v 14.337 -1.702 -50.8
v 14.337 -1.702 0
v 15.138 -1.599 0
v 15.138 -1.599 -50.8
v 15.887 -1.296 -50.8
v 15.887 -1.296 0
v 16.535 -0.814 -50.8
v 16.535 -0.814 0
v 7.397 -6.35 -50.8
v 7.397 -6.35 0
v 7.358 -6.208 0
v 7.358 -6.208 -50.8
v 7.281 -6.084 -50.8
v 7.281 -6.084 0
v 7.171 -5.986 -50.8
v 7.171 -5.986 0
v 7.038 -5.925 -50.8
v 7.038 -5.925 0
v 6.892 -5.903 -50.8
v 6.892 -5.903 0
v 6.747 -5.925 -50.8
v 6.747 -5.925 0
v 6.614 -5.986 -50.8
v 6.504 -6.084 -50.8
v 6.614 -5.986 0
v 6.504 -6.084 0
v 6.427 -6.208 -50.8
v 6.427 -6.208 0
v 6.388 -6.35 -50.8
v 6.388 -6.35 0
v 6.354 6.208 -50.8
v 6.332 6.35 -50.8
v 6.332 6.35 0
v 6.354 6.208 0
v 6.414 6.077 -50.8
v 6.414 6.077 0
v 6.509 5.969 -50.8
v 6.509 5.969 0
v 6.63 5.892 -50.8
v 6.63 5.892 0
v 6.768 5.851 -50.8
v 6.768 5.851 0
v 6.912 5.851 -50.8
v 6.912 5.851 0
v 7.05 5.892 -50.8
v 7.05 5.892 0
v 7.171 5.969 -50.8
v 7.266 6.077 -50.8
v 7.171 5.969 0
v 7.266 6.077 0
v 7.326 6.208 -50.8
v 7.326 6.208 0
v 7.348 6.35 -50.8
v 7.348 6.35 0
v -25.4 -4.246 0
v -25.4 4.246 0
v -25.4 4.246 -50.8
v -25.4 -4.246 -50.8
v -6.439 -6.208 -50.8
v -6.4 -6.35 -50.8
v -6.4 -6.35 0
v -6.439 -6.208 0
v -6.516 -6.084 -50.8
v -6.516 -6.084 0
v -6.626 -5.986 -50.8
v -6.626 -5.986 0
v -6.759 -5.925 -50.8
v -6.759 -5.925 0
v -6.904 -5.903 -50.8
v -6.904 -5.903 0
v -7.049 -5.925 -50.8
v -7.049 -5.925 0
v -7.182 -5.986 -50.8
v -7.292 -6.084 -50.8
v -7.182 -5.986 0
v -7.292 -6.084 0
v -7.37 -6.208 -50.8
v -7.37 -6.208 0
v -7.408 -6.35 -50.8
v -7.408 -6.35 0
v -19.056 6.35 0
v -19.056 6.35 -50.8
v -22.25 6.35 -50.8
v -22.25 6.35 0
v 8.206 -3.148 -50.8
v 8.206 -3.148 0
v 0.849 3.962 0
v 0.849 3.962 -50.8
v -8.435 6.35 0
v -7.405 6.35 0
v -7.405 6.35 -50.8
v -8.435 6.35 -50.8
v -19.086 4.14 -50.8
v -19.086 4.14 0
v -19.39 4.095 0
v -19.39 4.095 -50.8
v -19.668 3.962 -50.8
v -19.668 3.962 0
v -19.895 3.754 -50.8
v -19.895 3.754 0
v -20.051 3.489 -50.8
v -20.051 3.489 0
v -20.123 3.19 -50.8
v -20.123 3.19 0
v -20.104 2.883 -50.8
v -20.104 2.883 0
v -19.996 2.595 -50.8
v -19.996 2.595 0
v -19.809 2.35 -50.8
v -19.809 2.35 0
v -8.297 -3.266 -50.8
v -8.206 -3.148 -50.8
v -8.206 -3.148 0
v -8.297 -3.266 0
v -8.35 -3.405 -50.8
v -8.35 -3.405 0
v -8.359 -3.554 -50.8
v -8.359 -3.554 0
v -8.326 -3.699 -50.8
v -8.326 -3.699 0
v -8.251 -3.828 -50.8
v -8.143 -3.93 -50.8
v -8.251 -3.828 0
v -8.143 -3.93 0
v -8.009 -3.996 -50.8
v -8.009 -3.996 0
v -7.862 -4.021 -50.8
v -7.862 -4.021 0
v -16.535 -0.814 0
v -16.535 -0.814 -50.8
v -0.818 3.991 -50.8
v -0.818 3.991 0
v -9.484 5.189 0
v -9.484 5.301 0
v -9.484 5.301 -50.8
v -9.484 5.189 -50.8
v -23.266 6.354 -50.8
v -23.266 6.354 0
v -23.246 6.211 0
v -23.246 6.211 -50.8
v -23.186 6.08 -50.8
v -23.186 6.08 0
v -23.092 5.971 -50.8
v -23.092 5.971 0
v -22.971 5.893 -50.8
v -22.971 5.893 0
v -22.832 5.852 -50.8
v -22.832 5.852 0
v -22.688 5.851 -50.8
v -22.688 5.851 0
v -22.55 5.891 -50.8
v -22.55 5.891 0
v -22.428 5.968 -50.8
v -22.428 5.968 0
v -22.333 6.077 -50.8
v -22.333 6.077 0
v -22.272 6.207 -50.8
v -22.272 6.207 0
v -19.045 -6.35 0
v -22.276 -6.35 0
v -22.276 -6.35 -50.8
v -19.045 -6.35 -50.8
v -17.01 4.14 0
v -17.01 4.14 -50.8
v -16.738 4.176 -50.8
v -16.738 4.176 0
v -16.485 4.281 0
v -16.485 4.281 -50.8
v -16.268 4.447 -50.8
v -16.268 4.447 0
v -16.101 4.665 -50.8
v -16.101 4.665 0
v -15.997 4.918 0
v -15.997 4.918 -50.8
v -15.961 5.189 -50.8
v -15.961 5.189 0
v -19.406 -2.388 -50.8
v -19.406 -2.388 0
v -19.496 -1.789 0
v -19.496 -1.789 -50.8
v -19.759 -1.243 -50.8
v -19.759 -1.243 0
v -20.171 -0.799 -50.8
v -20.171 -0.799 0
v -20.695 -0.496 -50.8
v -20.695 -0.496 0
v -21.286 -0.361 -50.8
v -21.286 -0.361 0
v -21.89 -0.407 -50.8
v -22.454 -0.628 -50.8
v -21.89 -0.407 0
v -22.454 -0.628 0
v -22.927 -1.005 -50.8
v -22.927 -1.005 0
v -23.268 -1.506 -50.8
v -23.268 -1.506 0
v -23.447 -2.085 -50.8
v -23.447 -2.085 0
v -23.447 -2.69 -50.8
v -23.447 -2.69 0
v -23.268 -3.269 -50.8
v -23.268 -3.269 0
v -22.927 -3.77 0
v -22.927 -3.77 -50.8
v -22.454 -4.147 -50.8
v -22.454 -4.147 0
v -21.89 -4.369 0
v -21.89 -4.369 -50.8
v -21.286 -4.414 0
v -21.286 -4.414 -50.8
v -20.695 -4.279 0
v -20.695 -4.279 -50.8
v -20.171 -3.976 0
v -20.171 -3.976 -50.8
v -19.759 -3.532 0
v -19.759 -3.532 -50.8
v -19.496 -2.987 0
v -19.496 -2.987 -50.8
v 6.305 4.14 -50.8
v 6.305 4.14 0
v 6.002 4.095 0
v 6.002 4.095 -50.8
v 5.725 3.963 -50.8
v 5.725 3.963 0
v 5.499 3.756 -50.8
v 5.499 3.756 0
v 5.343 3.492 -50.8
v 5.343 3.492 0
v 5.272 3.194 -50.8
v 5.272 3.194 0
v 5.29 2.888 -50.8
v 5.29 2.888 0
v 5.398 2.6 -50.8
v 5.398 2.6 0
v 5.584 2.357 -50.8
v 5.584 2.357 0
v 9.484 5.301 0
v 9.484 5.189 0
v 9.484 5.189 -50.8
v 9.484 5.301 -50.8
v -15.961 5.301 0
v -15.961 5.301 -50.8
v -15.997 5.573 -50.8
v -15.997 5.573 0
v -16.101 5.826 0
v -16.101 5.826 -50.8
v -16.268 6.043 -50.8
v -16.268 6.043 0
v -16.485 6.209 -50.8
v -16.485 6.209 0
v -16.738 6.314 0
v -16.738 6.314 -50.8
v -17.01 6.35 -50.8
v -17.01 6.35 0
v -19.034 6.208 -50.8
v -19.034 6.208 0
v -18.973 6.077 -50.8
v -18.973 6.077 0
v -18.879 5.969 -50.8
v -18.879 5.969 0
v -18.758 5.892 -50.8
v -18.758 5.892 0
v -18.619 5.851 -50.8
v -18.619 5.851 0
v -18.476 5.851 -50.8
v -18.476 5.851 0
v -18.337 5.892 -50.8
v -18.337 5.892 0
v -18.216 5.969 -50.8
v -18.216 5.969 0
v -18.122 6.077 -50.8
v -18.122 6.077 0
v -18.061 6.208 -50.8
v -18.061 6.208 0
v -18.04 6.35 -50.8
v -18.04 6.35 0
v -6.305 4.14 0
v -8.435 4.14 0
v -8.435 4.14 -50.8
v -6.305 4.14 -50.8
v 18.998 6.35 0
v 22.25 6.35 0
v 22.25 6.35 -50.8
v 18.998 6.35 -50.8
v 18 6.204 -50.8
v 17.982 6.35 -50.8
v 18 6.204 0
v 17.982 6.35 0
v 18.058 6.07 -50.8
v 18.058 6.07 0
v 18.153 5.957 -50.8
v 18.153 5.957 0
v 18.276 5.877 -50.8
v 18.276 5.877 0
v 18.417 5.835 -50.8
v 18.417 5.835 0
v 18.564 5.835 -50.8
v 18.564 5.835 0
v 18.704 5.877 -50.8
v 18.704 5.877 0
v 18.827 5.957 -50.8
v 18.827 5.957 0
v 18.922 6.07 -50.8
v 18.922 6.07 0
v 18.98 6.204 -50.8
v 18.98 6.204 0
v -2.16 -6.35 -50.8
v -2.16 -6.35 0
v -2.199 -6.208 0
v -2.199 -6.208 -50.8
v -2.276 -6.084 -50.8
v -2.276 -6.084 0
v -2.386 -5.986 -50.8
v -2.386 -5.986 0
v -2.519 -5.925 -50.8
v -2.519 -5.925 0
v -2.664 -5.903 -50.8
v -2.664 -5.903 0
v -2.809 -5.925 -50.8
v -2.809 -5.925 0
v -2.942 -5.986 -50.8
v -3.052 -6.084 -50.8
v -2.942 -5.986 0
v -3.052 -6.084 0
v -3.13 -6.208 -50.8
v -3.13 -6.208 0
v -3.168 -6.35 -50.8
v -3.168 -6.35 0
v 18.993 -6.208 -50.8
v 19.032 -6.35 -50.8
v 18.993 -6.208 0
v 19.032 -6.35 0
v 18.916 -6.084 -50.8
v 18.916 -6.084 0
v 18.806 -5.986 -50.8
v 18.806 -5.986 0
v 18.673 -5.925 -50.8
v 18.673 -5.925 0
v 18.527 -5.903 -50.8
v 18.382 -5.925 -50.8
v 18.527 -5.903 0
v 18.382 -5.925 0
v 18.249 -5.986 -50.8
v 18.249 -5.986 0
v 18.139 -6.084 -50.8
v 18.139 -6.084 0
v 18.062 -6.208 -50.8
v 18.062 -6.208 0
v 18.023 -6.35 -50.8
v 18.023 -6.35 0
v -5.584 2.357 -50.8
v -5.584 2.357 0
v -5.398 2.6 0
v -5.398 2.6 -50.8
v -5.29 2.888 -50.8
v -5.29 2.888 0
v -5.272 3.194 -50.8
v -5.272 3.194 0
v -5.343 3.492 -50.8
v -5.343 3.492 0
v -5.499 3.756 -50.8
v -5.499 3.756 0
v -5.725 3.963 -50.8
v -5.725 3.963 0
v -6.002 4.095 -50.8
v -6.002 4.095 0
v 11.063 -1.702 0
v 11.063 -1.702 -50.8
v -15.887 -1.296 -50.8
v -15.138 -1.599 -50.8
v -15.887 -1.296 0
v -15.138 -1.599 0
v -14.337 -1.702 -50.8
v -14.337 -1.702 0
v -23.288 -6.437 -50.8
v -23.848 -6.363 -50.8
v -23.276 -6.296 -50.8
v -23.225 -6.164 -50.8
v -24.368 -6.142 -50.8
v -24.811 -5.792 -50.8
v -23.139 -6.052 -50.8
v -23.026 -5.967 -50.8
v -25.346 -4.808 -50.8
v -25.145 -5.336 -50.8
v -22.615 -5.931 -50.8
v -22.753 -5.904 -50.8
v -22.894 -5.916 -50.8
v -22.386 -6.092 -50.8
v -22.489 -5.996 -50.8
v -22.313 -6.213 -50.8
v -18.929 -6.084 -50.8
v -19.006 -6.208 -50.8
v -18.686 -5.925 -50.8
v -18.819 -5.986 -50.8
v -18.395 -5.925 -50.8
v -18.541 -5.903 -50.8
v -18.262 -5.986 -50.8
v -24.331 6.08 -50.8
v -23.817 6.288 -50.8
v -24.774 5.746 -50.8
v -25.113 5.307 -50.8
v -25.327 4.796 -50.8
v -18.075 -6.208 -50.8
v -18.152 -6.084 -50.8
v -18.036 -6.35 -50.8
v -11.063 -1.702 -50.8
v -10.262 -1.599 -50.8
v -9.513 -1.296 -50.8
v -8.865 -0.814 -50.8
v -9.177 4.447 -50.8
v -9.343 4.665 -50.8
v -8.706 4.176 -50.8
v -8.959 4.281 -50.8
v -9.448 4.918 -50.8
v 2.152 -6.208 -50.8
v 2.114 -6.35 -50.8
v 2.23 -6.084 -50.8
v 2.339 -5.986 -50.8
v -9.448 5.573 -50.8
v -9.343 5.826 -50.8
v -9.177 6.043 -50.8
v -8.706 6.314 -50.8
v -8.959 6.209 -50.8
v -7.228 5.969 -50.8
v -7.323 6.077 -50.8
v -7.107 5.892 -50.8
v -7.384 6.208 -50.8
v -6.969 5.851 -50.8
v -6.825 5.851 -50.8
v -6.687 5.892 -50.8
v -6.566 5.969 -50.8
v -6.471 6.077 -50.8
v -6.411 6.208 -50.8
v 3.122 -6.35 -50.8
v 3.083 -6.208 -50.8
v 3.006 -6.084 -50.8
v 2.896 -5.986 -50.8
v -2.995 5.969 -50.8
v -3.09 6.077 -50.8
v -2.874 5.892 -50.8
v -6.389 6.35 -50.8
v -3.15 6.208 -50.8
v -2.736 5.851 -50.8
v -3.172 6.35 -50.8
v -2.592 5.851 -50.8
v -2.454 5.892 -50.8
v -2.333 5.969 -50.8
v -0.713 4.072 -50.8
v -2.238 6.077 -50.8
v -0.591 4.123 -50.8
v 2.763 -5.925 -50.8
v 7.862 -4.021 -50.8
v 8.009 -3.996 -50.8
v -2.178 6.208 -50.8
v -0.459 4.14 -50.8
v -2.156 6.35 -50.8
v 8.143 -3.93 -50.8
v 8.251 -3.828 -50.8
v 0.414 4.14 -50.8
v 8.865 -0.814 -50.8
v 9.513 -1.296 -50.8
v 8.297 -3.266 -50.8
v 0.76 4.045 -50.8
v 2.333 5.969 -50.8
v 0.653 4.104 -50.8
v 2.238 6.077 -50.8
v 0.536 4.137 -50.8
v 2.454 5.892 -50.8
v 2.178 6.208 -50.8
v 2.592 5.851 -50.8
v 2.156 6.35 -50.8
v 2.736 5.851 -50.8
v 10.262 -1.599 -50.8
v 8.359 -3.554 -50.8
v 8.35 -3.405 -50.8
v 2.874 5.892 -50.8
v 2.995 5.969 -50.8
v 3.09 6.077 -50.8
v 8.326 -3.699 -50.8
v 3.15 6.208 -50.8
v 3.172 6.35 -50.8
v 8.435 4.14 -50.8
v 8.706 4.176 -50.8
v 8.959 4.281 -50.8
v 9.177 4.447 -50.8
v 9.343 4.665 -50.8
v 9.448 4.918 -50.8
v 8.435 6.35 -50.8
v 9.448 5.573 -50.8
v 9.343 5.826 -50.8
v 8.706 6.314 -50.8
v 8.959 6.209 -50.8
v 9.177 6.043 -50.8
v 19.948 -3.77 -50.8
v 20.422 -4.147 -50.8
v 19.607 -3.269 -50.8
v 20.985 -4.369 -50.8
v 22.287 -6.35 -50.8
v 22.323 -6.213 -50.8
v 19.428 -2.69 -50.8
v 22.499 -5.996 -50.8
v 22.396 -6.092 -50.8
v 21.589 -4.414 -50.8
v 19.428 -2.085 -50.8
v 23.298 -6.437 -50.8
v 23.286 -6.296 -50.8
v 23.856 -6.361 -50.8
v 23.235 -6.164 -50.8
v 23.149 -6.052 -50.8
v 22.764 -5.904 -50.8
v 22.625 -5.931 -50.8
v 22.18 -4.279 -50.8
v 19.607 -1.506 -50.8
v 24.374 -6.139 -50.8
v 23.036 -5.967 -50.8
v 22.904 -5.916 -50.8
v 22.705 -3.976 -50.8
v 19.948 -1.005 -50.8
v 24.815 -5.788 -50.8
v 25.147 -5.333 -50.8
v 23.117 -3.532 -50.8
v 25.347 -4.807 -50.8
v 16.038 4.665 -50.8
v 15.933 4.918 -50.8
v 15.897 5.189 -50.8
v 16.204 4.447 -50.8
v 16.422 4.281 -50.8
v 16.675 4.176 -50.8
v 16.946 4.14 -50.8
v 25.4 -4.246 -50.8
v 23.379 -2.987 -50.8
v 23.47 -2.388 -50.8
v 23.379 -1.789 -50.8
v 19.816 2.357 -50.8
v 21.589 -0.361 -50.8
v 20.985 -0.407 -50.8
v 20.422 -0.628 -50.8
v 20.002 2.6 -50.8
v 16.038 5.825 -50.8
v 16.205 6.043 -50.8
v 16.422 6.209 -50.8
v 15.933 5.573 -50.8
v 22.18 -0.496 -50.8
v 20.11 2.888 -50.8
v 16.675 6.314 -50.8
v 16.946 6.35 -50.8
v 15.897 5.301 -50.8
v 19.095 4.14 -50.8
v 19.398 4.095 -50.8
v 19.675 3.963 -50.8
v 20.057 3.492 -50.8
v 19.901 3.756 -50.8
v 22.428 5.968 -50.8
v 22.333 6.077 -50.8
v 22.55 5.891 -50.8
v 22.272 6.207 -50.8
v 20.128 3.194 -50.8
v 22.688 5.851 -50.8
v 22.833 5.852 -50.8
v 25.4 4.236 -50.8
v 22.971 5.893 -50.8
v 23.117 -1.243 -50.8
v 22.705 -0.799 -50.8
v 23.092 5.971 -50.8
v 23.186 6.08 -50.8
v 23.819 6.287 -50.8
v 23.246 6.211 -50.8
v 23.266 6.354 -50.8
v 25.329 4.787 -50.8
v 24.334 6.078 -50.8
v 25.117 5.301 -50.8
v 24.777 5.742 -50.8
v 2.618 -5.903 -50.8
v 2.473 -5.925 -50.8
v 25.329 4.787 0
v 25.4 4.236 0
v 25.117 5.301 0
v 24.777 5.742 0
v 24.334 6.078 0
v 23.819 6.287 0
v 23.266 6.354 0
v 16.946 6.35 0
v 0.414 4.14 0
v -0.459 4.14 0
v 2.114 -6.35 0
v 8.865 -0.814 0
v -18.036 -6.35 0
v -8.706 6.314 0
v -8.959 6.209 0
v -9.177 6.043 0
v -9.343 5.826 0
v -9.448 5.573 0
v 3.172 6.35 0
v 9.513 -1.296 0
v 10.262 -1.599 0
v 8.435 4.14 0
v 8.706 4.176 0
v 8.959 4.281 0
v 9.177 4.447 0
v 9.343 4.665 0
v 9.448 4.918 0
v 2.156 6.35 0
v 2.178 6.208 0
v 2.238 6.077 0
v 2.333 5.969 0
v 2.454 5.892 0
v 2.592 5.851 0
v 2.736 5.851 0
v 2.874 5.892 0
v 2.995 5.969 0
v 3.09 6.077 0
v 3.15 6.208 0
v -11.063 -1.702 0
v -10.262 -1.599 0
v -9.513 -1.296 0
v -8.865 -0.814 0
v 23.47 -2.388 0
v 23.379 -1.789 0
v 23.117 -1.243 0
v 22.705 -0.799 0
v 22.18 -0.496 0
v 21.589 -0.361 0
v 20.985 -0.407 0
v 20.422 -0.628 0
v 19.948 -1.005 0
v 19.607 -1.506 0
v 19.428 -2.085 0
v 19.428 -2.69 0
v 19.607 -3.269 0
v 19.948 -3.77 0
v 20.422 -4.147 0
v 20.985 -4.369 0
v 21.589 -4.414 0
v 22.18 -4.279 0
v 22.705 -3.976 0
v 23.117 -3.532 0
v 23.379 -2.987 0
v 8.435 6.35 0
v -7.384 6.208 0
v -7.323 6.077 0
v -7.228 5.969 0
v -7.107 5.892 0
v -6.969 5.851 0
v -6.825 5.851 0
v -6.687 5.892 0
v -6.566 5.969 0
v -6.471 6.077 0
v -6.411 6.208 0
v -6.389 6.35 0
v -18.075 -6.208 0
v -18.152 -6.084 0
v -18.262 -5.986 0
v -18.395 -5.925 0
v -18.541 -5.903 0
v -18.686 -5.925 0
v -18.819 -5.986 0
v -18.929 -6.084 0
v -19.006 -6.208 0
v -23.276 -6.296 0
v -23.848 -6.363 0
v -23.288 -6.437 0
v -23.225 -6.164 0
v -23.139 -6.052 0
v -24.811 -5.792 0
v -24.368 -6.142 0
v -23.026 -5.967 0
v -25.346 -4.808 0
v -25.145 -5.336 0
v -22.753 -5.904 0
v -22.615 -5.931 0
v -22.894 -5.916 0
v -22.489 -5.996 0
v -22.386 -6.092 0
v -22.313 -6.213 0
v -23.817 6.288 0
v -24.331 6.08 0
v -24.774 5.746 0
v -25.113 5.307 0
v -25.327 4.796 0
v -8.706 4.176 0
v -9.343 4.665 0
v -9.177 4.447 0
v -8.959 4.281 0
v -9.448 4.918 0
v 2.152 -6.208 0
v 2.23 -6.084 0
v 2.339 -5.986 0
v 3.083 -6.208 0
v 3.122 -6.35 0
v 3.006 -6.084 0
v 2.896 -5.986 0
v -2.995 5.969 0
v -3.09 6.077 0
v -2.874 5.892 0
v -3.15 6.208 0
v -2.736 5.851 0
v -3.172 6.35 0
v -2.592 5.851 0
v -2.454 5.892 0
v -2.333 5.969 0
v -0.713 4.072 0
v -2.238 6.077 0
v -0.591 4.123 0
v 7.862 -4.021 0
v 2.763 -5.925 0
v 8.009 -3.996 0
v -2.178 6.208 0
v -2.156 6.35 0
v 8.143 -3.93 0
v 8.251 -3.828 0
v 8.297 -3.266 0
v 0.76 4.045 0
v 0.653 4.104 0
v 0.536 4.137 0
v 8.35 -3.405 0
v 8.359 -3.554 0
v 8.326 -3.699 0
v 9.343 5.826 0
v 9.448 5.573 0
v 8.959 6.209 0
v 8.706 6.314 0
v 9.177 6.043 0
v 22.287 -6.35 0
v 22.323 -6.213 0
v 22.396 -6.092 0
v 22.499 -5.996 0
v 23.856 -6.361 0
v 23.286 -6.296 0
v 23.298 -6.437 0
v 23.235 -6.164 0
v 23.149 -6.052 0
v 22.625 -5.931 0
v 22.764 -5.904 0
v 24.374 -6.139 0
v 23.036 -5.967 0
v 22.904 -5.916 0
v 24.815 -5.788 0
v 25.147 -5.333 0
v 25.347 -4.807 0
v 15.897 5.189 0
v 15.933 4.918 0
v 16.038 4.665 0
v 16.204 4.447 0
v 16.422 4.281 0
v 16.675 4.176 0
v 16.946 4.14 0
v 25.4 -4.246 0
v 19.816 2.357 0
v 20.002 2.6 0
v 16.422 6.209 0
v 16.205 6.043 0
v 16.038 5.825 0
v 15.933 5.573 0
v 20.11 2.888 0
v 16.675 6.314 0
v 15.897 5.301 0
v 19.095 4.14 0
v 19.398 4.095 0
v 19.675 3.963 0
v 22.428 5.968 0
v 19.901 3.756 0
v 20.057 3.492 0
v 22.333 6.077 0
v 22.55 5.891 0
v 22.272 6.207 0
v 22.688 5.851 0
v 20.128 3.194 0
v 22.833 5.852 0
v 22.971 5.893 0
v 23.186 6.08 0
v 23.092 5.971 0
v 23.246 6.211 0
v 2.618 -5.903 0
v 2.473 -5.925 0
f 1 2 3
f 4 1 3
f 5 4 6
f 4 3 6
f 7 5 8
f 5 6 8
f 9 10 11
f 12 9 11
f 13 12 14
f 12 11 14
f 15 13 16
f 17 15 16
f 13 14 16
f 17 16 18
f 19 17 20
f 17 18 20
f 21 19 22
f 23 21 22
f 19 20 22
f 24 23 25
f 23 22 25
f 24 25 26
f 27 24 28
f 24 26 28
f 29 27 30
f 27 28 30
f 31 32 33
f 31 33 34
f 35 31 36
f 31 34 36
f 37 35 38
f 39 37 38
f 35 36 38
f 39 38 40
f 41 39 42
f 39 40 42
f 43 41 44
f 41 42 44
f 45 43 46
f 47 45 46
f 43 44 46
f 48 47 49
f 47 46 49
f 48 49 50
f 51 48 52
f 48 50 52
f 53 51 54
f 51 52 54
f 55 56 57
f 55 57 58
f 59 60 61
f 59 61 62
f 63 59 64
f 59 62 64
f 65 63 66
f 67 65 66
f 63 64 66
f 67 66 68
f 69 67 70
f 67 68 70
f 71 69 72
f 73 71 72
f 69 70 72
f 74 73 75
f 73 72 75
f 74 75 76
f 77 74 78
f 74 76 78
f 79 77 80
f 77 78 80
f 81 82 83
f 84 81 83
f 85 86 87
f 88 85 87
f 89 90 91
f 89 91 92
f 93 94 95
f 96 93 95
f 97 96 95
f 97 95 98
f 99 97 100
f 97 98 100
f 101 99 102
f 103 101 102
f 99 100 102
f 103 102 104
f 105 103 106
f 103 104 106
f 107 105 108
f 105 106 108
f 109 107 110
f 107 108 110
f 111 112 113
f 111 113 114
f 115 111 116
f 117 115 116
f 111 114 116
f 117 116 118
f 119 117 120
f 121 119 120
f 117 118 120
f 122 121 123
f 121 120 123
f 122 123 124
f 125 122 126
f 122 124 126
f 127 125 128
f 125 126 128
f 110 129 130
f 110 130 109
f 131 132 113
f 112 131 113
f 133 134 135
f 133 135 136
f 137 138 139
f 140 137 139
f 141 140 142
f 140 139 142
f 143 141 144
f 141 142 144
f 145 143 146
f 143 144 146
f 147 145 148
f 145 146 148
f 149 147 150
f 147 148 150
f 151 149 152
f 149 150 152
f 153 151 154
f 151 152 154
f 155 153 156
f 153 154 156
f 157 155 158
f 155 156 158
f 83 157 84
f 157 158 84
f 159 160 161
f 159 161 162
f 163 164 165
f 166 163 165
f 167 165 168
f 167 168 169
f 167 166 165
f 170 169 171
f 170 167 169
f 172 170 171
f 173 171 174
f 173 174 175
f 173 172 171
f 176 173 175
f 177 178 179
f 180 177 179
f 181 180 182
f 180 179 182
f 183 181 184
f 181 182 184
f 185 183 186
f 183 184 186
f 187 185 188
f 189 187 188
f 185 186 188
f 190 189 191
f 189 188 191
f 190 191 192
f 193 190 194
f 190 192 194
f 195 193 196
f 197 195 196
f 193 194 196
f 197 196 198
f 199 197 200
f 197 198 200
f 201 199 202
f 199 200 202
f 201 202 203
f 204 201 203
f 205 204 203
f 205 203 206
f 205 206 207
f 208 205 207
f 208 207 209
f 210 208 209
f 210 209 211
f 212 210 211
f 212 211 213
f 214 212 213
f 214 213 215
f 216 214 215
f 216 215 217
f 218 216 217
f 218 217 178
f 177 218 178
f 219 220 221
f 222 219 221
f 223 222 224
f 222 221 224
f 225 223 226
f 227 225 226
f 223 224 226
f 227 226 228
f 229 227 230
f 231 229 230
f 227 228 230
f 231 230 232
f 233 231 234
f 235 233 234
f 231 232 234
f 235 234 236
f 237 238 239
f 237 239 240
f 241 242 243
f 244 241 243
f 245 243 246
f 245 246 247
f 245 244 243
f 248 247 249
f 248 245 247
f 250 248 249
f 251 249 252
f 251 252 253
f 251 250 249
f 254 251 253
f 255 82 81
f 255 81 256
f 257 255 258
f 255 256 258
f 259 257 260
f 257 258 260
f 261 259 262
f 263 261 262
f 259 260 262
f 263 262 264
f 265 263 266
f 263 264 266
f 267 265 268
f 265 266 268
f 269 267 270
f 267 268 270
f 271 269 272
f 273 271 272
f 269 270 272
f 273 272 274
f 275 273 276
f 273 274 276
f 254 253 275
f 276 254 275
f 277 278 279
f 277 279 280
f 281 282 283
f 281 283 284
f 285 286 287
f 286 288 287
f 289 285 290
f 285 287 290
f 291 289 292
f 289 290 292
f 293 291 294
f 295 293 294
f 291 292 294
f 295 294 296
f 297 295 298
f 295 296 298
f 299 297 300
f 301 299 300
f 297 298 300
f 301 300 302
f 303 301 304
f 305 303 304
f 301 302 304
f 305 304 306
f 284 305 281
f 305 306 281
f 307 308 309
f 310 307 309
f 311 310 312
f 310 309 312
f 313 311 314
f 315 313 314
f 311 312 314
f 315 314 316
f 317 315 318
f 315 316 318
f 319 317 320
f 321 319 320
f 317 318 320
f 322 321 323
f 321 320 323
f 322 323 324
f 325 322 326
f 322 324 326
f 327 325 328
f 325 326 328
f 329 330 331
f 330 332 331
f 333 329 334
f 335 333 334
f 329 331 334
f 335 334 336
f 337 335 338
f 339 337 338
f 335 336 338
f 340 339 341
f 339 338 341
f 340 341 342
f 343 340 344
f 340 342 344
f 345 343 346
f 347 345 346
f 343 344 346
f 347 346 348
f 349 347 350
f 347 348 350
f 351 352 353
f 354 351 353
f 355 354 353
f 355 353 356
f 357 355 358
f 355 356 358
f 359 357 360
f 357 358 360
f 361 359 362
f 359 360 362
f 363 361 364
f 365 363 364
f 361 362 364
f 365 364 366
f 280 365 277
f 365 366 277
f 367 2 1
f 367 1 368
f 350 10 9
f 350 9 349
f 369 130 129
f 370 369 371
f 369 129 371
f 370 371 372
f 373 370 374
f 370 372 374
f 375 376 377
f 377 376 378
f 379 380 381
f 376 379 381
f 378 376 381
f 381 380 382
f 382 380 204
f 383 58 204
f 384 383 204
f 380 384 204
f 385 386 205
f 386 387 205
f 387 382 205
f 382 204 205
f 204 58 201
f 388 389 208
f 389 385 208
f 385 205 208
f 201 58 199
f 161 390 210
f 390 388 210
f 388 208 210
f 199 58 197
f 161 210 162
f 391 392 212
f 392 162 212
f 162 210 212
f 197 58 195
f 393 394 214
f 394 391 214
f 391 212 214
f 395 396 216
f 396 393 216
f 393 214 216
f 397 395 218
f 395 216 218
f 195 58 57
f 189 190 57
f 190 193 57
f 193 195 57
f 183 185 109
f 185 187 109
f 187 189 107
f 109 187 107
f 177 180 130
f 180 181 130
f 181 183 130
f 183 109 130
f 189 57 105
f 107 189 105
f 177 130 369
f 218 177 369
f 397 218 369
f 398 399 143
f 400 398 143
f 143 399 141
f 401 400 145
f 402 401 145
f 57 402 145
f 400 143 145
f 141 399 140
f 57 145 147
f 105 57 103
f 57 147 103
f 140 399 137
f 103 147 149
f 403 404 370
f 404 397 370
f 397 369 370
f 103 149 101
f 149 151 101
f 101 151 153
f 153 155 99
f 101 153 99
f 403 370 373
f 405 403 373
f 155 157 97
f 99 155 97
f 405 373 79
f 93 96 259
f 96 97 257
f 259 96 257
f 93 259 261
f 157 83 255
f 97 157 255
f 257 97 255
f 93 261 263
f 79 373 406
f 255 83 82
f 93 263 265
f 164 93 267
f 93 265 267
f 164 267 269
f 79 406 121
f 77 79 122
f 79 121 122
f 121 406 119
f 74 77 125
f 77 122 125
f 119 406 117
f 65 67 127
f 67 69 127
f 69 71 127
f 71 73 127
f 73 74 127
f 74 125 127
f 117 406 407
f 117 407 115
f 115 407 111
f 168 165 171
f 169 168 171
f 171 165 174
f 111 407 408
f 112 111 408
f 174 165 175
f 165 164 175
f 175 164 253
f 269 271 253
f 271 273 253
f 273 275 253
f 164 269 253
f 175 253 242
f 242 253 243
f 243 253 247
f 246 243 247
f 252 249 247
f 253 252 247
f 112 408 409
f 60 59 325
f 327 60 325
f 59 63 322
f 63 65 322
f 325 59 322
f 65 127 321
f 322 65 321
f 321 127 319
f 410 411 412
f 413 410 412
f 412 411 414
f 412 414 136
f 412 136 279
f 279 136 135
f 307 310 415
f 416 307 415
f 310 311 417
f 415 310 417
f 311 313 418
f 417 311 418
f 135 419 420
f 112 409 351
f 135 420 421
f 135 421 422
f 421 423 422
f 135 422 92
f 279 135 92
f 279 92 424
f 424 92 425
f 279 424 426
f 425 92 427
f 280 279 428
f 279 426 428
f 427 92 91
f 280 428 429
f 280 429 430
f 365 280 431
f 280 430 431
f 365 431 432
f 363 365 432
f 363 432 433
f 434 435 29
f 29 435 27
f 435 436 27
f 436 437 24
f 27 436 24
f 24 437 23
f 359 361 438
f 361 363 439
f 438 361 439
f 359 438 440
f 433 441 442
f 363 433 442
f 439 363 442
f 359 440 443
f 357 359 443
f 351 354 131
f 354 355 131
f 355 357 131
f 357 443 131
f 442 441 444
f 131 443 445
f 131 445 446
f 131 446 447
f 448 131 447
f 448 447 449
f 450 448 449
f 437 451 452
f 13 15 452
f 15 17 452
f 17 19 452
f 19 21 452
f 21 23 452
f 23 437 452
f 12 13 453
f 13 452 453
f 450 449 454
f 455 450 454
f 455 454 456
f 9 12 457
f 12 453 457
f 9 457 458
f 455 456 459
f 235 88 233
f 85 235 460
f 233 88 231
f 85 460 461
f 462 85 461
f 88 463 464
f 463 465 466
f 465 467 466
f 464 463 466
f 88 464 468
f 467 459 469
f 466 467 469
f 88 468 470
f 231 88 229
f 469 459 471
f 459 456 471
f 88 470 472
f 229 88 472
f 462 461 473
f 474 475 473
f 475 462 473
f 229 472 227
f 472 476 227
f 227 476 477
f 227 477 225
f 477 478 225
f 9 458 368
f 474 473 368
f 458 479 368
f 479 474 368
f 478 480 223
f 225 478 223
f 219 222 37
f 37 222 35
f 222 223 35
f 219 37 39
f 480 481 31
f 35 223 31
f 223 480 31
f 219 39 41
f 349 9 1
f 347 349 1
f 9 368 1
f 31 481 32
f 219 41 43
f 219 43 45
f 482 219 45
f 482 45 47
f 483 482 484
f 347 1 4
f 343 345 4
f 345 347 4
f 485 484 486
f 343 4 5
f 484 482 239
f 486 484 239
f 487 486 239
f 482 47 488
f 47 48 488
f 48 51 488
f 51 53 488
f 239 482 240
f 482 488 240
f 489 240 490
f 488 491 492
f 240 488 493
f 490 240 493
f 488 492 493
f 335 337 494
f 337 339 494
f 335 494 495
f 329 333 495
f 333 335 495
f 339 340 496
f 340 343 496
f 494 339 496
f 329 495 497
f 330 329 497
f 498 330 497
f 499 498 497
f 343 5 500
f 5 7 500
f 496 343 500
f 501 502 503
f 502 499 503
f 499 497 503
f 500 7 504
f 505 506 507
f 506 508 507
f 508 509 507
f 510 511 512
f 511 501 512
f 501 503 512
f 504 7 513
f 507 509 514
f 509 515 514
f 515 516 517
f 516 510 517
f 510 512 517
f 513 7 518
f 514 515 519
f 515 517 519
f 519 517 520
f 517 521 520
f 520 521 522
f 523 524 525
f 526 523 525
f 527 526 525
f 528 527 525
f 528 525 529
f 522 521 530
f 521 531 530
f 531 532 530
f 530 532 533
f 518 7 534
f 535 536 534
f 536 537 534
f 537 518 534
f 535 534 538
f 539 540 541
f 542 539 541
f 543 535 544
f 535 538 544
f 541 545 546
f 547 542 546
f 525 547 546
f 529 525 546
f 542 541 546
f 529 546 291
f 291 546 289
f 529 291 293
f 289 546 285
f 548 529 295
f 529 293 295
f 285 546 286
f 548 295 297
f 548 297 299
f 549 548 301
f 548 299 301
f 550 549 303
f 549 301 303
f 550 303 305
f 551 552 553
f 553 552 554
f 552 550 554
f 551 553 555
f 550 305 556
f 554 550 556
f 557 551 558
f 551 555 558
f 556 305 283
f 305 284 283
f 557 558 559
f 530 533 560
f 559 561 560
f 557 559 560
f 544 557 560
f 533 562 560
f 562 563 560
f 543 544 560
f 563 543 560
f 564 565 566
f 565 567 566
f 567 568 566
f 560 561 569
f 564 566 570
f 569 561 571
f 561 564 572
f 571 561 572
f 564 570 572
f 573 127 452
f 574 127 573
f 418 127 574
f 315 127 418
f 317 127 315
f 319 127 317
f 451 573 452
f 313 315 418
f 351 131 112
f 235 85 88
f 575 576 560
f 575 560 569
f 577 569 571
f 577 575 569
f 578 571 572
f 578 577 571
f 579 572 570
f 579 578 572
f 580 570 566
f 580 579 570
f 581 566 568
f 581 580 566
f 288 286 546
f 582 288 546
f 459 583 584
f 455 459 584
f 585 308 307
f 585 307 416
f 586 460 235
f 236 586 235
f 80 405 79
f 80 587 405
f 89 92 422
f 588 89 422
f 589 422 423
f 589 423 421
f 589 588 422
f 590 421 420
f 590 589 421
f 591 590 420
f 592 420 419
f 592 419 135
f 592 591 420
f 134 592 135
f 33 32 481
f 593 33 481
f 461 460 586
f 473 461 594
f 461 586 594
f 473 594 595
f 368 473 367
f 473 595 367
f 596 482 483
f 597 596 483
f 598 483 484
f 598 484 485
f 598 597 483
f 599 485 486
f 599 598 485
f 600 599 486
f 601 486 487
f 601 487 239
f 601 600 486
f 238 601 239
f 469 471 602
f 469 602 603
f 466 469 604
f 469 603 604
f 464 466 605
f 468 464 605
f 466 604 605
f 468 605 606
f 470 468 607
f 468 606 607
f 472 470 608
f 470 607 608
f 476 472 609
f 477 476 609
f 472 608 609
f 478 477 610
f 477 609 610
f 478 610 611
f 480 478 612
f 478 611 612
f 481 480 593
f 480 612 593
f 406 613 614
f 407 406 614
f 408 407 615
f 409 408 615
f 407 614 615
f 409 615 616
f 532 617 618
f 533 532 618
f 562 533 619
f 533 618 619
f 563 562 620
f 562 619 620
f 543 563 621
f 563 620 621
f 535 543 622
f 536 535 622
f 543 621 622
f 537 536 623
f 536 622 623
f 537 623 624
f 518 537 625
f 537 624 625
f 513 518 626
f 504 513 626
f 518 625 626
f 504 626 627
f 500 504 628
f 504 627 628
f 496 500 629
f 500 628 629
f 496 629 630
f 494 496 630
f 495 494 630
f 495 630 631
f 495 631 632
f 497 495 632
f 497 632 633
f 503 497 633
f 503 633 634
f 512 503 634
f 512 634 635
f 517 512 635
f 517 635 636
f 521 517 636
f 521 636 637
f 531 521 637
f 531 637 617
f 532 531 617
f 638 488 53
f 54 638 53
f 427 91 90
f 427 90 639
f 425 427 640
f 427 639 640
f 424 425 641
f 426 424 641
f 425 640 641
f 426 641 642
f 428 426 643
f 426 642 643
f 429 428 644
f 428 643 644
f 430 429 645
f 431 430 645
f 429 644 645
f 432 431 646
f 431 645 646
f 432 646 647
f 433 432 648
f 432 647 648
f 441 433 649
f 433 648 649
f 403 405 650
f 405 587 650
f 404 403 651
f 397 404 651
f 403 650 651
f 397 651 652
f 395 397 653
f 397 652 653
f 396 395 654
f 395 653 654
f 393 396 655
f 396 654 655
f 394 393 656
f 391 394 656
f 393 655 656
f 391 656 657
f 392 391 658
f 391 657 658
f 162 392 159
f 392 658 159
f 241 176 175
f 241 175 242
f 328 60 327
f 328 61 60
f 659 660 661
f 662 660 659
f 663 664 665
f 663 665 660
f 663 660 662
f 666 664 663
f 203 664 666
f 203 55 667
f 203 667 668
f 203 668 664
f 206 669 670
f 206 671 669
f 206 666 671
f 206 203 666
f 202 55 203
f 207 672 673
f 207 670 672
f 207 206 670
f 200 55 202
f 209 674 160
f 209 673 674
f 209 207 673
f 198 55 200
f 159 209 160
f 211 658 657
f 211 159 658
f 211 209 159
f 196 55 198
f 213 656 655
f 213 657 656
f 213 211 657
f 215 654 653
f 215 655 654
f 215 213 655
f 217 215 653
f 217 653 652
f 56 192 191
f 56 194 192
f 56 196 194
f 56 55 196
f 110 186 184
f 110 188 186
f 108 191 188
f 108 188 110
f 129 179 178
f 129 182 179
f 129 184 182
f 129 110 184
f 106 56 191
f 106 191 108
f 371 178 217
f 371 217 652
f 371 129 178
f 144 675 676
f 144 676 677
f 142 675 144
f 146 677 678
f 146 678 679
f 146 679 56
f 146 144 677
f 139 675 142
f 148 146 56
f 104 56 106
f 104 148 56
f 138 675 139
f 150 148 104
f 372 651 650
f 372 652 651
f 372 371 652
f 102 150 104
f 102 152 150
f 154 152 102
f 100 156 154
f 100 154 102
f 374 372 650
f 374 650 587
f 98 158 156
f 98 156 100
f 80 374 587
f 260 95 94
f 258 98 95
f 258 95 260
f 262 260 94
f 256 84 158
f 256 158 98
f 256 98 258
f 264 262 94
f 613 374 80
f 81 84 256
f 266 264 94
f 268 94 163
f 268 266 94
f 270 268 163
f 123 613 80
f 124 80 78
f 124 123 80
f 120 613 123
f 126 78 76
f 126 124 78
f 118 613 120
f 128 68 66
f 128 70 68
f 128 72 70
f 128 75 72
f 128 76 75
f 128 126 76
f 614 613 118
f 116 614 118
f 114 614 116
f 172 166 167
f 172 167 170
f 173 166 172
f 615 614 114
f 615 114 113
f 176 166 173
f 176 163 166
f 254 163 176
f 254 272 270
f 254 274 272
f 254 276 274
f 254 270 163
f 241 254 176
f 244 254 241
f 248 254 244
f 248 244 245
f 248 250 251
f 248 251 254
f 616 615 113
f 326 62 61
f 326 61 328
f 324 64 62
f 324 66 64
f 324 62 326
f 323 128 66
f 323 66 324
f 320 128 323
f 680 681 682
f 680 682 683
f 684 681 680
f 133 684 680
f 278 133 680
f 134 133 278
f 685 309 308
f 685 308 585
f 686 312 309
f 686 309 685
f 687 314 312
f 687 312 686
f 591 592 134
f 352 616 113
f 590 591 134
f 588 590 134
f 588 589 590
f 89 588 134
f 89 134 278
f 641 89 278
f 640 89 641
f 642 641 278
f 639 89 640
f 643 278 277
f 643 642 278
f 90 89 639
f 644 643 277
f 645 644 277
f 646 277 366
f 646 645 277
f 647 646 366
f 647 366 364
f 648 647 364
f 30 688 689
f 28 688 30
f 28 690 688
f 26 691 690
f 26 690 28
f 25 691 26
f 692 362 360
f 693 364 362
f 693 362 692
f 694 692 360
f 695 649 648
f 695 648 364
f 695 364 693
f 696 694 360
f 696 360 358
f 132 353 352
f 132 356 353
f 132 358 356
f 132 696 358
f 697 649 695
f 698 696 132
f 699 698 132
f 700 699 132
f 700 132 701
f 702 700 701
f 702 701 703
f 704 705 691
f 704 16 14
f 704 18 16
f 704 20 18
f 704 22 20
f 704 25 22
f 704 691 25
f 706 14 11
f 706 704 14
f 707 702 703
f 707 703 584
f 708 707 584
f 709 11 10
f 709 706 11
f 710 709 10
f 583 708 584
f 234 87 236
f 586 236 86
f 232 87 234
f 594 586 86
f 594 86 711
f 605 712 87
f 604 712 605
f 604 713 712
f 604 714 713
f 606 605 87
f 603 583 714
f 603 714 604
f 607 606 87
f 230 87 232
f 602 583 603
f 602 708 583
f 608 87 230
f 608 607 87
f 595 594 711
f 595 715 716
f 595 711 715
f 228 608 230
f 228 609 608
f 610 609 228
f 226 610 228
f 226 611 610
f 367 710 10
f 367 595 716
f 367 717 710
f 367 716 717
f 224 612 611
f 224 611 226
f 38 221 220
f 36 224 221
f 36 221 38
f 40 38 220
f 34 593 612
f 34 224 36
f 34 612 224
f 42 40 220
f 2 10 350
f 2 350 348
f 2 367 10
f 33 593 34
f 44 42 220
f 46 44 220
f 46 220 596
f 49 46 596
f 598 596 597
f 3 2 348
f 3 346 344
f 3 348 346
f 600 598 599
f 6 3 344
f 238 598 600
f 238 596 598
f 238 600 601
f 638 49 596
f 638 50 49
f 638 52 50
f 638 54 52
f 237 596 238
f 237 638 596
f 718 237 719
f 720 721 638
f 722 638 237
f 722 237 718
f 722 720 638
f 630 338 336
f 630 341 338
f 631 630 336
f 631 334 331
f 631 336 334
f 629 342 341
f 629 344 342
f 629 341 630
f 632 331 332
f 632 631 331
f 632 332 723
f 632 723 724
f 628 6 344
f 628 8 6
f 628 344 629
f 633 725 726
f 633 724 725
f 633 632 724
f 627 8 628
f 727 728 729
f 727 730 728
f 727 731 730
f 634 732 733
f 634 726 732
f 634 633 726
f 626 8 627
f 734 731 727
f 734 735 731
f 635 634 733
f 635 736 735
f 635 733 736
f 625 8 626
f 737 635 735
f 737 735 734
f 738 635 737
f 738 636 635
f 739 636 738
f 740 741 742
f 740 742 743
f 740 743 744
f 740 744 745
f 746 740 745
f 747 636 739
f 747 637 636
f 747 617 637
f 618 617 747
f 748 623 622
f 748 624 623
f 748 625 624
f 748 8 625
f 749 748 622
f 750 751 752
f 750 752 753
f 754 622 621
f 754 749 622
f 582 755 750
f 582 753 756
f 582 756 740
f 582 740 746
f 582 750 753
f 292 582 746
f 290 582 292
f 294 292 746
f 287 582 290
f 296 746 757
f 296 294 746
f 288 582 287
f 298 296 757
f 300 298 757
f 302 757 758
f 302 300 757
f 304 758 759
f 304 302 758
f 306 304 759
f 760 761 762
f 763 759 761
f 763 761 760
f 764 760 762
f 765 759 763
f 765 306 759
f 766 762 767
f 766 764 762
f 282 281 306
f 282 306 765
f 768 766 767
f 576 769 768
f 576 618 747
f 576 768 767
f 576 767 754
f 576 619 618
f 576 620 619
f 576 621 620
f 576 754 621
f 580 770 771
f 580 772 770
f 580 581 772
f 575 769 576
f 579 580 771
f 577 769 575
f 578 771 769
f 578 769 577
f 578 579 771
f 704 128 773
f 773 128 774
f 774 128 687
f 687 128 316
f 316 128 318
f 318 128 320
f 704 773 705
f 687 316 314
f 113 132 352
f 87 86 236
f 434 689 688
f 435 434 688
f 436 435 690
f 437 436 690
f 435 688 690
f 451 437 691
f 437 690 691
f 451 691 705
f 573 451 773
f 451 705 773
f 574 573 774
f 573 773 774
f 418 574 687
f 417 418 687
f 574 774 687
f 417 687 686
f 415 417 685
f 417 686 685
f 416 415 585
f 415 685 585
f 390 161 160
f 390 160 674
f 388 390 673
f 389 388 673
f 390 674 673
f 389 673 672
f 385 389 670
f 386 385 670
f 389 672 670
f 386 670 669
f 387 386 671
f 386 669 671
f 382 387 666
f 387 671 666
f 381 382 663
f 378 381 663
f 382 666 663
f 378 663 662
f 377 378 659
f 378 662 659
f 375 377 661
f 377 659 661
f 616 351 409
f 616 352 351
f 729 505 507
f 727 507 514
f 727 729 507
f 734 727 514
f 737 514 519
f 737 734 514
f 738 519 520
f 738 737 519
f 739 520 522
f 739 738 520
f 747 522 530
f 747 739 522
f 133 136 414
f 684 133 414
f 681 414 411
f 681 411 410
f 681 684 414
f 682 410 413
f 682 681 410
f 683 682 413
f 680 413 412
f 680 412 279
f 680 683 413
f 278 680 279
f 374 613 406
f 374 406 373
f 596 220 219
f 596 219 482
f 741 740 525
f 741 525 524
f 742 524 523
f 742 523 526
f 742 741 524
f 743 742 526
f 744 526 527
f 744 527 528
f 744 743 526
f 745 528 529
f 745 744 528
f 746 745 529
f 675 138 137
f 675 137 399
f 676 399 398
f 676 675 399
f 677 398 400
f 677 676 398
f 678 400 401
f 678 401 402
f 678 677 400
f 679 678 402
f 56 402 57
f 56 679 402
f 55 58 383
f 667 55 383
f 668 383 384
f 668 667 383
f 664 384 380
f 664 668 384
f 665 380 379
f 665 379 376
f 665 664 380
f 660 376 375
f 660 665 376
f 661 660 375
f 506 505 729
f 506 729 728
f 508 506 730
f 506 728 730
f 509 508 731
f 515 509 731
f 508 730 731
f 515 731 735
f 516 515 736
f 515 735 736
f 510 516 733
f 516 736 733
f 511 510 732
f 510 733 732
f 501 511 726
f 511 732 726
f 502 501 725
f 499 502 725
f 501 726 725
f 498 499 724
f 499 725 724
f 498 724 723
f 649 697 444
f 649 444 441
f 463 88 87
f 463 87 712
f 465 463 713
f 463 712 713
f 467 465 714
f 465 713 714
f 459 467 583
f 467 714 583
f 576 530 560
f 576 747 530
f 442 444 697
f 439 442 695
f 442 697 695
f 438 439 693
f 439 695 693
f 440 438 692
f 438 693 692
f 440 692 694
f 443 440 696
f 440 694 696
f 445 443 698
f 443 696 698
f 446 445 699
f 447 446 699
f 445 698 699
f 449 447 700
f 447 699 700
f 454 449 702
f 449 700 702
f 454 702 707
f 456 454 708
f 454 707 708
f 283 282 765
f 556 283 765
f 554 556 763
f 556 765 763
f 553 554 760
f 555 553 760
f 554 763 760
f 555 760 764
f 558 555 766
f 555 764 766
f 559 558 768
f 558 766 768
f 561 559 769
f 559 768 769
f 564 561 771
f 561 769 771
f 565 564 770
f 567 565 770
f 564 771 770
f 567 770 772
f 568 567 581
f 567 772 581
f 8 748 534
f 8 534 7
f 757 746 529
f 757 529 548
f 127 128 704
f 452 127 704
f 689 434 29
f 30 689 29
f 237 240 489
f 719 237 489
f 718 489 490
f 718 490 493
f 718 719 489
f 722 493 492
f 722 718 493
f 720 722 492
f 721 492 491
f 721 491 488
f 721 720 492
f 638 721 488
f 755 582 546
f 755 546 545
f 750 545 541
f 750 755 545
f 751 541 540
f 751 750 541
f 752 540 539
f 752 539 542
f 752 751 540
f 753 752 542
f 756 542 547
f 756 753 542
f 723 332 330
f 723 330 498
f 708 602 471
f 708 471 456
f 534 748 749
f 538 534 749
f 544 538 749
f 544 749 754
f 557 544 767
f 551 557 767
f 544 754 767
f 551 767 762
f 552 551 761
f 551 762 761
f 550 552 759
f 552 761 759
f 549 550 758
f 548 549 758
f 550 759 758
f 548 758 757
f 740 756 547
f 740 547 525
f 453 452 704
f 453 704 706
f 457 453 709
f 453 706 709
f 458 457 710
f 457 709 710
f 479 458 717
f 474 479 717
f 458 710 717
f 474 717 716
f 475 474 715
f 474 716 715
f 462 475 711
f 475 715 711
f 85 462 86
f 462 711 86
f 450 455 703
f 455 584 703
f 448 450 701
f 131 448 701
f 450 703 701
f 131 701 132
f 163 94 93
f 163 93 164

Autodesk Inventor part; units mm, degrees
ref_plane "YZ Plane" through (0, 0, 0) normal (1, 0, 0) x (0, 1, 0)
ref_plane "XZ Plane" through (0, 0, 0) normal (0, 1, 0) x (-1, 0, 0)
ref_plane "XY Plane" through (0, 0, 0) normal (0, 0, 1) x (1, 0, 0)
sketch "Sketch1" plane through (0, 0, 0) normal (0, 0, 1) x (1, 0, 0)
  arc A0 (-8.2061, -3.1475) -> (-7.8618, -4.0207) centre (-7.8531, -3.5128) ccw
  line L0 (-0.8184, 3.9914) -> (-8.2061, -3.1475)
  arc A1 (-0.4592, 4.1402) -> (-0.8184, 3.9914) centre (-0.4592, 3.6322) ccw
  line L1 (0.4145, 4.1402) -> (-0.4592, 4.1402)
  arc A2 (0.8488, 3.962) -> (0.4145, 4.1402) centre (0.4606, 3.6343) ccw
  line L2 (8.2061, -3.1475) -> (0.8488, 3.962)
  arc A3 (7.8618, -4.0207) -> (8.2061, -3.1475) centre (7.8531, -3.5128) ccw
  line L3 (-7.8618, -4.0207) -> (7.8618, -4.0207)
  circle A4 centre (21.4376, -2.3876) radius 2.032
  circle A5 centre (-21.4376, -2.3876) radius 2.032
  arc A6 (16.9463, 6.35) -> (15.8972, 5.301) centre (16.9463, 5.301) ccw
  line L4 (15.8972, 5.301) -> (15.8972, 5.1892)
  arc A7 (15.8972, 5.1892) -> (16.9463, 4.1402) centre (16.9463, 5.1892) ccw
  line L5 (16.9463, 4.1402) -> (19.0952, 4.1402)
  arc A8 (19.8159, 2.3571) -> (19.0952, 4.1402) centre (19.0952, 3.103) ccw
  line L6 (19.8159, 2.3571) -> (16.5346, -0.8136)
  arc A9 (14.3374, -1.7018) -> (16.5346, -0.8136) centre (14.3374, 1.4602) ccw
  line L7 (14.3374, -1.7018) -> (11.0626, -1.7018)
  arc A10 (8.8654, -0.8136) -> (11.0626, -1.7018) centre (11.0626, 1.4602) ccw
  line L8 (8.8654, -0.8136) -> (5.5841, 2.3571)
  arc A11 (6.3048, 4.1402) -> (5.5841, 2.3571) centre (6.3048, 3.103) ccw
  line L9 (6.3048, 4.1402) -> (8.4349, 4.1402)
  arc A12 (8.4349, 4.1402) -> (9.4839, 5.1892) centre (8.4349, 5.1892) ccw
  line L10 (9.4839, 5.1892) -> (9.4839, 5.301)
  arc A13 (9.4839, 5.301) -> (8.4349, 6.35) centre (8.4349, 5.301) ccw
  line L11 (8.4349, 6.35) -> (7.3479, 6.35)
  arc A14 (6.332, 6.35) -> (7.3479, 6.35) centre (6.8399, 6.3541) ccw
  line L12 (6.332, 6.35) -> (3.1719, 6.35)
  arc A15 (2.156, 6.35) -> (3.1719, 6.35) centre (2.6639, 6.3541) ccw
  line L13 (2.156, 6.35) -> (-2.156, 6.35)
  arc A16 (-3.1719, 6.35) -> (-2.156, 6.35) centre (-2.6639, 6.3541) ccw
  line L14 (-3.1719, 6.35) -> (-6.3893, 6.35)
  arc A17 (-7.4052, 6.35) -> (-6.3893, 6.35) centre (-6.8973, 6.3541) ccw
  line L15 (-7.4052, 6.35) -> (-8.4349, 6.35)
  arc A18 (-8.4349, 6.35) -> (-9.4839, 5.301) centre (-8.4349, 5.301) ccw
  line L16 (-9.4839, 5.301) -> (-9.4839, 5.1892)
  arc A19 (-9.4839, 5.1892) -> (-8.4349, 4.1402) centre (-8.4349, 5.1892) ccw
  line L17 (-8.4349, 4.1402) -> (-6.3048, 4.1402)
  arc A20 (-5.5841, 2.3571) -> (-6.3048, 4.1402) centre (-6.3048, 3.103) ccw
  line L18 (-5.5841, 2.3571) -> (-8.8654, -0.8136)
  arc A21 (-11.0626, -1.7018) -> (-8.8654, -0.8136) centre (-11.0626, 1.4602) ccw
  line L19 (-11.0626, -1.7018) -> (-14.3374, -1.7018)
  arc A22 (-16.5346, -0.8136) -> (-14.3374, -1.7018) centre (-14.3374, 1.4602) ccw
  line L20 (-16.5346, -0.8136) -> (-19.809, 2.3504)
  arc A23 (-19.0855, 4.1402) -> (-19.809, 2.3504) centre (-19.0855, 3.0991) ccw
  line L21 (-19.0855, 4.1402) -> (-17.0099, 4.1402)
  arc A24 (-17.0099, 4.1402) -> (-15.9609, 5.1892) centre (-17.0099, 5.1892) ccw
  line L22 (-15.9609, 5.1892) -> (-15.9609, 5.301)
  arc A25 (-15.9609, 5.301) -> (-17.0099, 6.35) centre (-17.0099, 5.301) ccw
  line L23 (-17.0099, 6.35) -> (-18.0395, 6.35)
  arc A26 (-19.0555, 6.35) -> (-18.0395, 6.35) centre (-18.5475, 6.3541) ccw
  line L24 (-19.0555, 6.35) -> (-22.2504, 6.35)
  arc A27 (-23.2664, 6.354) -> (-22.2504, 6.35) centre (-22.7584, 6.3541) ccw
  arc A28 (-23.2664, 6.354) -> (-25.4, 4.2459) centre (-23.2918, 4.2459) ccw
  line L25 (-25.4, 4.2459) -> (-25.4, -4.2459)
  arc A29 (-25.4, -4.2459) -> (-23.2881, -6.4371) centre (-23.2933, -4.3288) ccw
  arc A30 (-22.2765, -6.35) -> (-23.2881, -6.4371) centre (-22.7808, -6.4114) ccw
  line L26 (-22.2765, -6.35) -> (-19.0448, -6.35)
  arc A31 (-18.0363, -6.35) -> (-19.0448, -6.35) centre (-18.5406, -6.4114) ccw
  line L27 (-18.0363, -6.35) -> (-7.4084, -6.35)
  arc A32 (-6.3999, -6.35) -> (-7.4084, -6.35) centre (-6.9041, -6.4114) ccw
  line L28 (-6.3999, -6.35) -> (-3.1684, -6.35)
  arc A33 (-2.1599, -6.35) -> (-3.1684, -6.35) centre (-2.6641, -6.4114) ccw
  line L29 (-2.1599, -6.35) -> (2.1135, -6.35)
  arc A34 (3.122, -6.35) -> (2.1135, -6.35) centre (2.6177, -6.4114) ccw
  line L30 (3.122, -6.35) -> (6.3882, -6.35)
  arc A35 (7.3967, -6.35) -> (6.3882, -6.35) centre (6.8925, -6.4114) ccw
  line L31 (7.3967, -6.35) -> (18.0231, -6.35)
  arc A36 (19.0317, -6.35) -> (18.0231, -6.35) centre (18.5274, -6.4114) ccw
  line L32 (19.0317, -6.35) -> (22.2866, -6.35)
  arc A37 (23.2982, -6.4371) -> (22.2866, -6.35) centre (22.7909, -6.4114) ccw
  arc A38 (23.2982, -6.4371) -> (25.4, -4.2459) centre (23.2933, -4.3288) ccw
  line L33 (25.4, -4.2459) -> (25.4, 4.2355)
  arc A39 (25.4, 4.2355) -> (23.2665, 6.354) centre (23.2918, 4.2459) ccw
  arc A40 (22.2505, 6.35) -> (23.2665, 6.354) centre (22.7585, 6.3541) ccw
  line L34 (22.2505, 6.35) -> (18.998, 6.35)
  arc A41 (17.9823, 6.35) -> (18.998, 6.35) centre (18.4902, 6.3374) ccw
  line L35 (17.9823, 6.35) -> (16.9463, 6.35)
  point P0 (0, 0)
extrude "Extrusion1" add sketch "Sketch1" against normal blind 50.8
properties part number "2012_2in"
